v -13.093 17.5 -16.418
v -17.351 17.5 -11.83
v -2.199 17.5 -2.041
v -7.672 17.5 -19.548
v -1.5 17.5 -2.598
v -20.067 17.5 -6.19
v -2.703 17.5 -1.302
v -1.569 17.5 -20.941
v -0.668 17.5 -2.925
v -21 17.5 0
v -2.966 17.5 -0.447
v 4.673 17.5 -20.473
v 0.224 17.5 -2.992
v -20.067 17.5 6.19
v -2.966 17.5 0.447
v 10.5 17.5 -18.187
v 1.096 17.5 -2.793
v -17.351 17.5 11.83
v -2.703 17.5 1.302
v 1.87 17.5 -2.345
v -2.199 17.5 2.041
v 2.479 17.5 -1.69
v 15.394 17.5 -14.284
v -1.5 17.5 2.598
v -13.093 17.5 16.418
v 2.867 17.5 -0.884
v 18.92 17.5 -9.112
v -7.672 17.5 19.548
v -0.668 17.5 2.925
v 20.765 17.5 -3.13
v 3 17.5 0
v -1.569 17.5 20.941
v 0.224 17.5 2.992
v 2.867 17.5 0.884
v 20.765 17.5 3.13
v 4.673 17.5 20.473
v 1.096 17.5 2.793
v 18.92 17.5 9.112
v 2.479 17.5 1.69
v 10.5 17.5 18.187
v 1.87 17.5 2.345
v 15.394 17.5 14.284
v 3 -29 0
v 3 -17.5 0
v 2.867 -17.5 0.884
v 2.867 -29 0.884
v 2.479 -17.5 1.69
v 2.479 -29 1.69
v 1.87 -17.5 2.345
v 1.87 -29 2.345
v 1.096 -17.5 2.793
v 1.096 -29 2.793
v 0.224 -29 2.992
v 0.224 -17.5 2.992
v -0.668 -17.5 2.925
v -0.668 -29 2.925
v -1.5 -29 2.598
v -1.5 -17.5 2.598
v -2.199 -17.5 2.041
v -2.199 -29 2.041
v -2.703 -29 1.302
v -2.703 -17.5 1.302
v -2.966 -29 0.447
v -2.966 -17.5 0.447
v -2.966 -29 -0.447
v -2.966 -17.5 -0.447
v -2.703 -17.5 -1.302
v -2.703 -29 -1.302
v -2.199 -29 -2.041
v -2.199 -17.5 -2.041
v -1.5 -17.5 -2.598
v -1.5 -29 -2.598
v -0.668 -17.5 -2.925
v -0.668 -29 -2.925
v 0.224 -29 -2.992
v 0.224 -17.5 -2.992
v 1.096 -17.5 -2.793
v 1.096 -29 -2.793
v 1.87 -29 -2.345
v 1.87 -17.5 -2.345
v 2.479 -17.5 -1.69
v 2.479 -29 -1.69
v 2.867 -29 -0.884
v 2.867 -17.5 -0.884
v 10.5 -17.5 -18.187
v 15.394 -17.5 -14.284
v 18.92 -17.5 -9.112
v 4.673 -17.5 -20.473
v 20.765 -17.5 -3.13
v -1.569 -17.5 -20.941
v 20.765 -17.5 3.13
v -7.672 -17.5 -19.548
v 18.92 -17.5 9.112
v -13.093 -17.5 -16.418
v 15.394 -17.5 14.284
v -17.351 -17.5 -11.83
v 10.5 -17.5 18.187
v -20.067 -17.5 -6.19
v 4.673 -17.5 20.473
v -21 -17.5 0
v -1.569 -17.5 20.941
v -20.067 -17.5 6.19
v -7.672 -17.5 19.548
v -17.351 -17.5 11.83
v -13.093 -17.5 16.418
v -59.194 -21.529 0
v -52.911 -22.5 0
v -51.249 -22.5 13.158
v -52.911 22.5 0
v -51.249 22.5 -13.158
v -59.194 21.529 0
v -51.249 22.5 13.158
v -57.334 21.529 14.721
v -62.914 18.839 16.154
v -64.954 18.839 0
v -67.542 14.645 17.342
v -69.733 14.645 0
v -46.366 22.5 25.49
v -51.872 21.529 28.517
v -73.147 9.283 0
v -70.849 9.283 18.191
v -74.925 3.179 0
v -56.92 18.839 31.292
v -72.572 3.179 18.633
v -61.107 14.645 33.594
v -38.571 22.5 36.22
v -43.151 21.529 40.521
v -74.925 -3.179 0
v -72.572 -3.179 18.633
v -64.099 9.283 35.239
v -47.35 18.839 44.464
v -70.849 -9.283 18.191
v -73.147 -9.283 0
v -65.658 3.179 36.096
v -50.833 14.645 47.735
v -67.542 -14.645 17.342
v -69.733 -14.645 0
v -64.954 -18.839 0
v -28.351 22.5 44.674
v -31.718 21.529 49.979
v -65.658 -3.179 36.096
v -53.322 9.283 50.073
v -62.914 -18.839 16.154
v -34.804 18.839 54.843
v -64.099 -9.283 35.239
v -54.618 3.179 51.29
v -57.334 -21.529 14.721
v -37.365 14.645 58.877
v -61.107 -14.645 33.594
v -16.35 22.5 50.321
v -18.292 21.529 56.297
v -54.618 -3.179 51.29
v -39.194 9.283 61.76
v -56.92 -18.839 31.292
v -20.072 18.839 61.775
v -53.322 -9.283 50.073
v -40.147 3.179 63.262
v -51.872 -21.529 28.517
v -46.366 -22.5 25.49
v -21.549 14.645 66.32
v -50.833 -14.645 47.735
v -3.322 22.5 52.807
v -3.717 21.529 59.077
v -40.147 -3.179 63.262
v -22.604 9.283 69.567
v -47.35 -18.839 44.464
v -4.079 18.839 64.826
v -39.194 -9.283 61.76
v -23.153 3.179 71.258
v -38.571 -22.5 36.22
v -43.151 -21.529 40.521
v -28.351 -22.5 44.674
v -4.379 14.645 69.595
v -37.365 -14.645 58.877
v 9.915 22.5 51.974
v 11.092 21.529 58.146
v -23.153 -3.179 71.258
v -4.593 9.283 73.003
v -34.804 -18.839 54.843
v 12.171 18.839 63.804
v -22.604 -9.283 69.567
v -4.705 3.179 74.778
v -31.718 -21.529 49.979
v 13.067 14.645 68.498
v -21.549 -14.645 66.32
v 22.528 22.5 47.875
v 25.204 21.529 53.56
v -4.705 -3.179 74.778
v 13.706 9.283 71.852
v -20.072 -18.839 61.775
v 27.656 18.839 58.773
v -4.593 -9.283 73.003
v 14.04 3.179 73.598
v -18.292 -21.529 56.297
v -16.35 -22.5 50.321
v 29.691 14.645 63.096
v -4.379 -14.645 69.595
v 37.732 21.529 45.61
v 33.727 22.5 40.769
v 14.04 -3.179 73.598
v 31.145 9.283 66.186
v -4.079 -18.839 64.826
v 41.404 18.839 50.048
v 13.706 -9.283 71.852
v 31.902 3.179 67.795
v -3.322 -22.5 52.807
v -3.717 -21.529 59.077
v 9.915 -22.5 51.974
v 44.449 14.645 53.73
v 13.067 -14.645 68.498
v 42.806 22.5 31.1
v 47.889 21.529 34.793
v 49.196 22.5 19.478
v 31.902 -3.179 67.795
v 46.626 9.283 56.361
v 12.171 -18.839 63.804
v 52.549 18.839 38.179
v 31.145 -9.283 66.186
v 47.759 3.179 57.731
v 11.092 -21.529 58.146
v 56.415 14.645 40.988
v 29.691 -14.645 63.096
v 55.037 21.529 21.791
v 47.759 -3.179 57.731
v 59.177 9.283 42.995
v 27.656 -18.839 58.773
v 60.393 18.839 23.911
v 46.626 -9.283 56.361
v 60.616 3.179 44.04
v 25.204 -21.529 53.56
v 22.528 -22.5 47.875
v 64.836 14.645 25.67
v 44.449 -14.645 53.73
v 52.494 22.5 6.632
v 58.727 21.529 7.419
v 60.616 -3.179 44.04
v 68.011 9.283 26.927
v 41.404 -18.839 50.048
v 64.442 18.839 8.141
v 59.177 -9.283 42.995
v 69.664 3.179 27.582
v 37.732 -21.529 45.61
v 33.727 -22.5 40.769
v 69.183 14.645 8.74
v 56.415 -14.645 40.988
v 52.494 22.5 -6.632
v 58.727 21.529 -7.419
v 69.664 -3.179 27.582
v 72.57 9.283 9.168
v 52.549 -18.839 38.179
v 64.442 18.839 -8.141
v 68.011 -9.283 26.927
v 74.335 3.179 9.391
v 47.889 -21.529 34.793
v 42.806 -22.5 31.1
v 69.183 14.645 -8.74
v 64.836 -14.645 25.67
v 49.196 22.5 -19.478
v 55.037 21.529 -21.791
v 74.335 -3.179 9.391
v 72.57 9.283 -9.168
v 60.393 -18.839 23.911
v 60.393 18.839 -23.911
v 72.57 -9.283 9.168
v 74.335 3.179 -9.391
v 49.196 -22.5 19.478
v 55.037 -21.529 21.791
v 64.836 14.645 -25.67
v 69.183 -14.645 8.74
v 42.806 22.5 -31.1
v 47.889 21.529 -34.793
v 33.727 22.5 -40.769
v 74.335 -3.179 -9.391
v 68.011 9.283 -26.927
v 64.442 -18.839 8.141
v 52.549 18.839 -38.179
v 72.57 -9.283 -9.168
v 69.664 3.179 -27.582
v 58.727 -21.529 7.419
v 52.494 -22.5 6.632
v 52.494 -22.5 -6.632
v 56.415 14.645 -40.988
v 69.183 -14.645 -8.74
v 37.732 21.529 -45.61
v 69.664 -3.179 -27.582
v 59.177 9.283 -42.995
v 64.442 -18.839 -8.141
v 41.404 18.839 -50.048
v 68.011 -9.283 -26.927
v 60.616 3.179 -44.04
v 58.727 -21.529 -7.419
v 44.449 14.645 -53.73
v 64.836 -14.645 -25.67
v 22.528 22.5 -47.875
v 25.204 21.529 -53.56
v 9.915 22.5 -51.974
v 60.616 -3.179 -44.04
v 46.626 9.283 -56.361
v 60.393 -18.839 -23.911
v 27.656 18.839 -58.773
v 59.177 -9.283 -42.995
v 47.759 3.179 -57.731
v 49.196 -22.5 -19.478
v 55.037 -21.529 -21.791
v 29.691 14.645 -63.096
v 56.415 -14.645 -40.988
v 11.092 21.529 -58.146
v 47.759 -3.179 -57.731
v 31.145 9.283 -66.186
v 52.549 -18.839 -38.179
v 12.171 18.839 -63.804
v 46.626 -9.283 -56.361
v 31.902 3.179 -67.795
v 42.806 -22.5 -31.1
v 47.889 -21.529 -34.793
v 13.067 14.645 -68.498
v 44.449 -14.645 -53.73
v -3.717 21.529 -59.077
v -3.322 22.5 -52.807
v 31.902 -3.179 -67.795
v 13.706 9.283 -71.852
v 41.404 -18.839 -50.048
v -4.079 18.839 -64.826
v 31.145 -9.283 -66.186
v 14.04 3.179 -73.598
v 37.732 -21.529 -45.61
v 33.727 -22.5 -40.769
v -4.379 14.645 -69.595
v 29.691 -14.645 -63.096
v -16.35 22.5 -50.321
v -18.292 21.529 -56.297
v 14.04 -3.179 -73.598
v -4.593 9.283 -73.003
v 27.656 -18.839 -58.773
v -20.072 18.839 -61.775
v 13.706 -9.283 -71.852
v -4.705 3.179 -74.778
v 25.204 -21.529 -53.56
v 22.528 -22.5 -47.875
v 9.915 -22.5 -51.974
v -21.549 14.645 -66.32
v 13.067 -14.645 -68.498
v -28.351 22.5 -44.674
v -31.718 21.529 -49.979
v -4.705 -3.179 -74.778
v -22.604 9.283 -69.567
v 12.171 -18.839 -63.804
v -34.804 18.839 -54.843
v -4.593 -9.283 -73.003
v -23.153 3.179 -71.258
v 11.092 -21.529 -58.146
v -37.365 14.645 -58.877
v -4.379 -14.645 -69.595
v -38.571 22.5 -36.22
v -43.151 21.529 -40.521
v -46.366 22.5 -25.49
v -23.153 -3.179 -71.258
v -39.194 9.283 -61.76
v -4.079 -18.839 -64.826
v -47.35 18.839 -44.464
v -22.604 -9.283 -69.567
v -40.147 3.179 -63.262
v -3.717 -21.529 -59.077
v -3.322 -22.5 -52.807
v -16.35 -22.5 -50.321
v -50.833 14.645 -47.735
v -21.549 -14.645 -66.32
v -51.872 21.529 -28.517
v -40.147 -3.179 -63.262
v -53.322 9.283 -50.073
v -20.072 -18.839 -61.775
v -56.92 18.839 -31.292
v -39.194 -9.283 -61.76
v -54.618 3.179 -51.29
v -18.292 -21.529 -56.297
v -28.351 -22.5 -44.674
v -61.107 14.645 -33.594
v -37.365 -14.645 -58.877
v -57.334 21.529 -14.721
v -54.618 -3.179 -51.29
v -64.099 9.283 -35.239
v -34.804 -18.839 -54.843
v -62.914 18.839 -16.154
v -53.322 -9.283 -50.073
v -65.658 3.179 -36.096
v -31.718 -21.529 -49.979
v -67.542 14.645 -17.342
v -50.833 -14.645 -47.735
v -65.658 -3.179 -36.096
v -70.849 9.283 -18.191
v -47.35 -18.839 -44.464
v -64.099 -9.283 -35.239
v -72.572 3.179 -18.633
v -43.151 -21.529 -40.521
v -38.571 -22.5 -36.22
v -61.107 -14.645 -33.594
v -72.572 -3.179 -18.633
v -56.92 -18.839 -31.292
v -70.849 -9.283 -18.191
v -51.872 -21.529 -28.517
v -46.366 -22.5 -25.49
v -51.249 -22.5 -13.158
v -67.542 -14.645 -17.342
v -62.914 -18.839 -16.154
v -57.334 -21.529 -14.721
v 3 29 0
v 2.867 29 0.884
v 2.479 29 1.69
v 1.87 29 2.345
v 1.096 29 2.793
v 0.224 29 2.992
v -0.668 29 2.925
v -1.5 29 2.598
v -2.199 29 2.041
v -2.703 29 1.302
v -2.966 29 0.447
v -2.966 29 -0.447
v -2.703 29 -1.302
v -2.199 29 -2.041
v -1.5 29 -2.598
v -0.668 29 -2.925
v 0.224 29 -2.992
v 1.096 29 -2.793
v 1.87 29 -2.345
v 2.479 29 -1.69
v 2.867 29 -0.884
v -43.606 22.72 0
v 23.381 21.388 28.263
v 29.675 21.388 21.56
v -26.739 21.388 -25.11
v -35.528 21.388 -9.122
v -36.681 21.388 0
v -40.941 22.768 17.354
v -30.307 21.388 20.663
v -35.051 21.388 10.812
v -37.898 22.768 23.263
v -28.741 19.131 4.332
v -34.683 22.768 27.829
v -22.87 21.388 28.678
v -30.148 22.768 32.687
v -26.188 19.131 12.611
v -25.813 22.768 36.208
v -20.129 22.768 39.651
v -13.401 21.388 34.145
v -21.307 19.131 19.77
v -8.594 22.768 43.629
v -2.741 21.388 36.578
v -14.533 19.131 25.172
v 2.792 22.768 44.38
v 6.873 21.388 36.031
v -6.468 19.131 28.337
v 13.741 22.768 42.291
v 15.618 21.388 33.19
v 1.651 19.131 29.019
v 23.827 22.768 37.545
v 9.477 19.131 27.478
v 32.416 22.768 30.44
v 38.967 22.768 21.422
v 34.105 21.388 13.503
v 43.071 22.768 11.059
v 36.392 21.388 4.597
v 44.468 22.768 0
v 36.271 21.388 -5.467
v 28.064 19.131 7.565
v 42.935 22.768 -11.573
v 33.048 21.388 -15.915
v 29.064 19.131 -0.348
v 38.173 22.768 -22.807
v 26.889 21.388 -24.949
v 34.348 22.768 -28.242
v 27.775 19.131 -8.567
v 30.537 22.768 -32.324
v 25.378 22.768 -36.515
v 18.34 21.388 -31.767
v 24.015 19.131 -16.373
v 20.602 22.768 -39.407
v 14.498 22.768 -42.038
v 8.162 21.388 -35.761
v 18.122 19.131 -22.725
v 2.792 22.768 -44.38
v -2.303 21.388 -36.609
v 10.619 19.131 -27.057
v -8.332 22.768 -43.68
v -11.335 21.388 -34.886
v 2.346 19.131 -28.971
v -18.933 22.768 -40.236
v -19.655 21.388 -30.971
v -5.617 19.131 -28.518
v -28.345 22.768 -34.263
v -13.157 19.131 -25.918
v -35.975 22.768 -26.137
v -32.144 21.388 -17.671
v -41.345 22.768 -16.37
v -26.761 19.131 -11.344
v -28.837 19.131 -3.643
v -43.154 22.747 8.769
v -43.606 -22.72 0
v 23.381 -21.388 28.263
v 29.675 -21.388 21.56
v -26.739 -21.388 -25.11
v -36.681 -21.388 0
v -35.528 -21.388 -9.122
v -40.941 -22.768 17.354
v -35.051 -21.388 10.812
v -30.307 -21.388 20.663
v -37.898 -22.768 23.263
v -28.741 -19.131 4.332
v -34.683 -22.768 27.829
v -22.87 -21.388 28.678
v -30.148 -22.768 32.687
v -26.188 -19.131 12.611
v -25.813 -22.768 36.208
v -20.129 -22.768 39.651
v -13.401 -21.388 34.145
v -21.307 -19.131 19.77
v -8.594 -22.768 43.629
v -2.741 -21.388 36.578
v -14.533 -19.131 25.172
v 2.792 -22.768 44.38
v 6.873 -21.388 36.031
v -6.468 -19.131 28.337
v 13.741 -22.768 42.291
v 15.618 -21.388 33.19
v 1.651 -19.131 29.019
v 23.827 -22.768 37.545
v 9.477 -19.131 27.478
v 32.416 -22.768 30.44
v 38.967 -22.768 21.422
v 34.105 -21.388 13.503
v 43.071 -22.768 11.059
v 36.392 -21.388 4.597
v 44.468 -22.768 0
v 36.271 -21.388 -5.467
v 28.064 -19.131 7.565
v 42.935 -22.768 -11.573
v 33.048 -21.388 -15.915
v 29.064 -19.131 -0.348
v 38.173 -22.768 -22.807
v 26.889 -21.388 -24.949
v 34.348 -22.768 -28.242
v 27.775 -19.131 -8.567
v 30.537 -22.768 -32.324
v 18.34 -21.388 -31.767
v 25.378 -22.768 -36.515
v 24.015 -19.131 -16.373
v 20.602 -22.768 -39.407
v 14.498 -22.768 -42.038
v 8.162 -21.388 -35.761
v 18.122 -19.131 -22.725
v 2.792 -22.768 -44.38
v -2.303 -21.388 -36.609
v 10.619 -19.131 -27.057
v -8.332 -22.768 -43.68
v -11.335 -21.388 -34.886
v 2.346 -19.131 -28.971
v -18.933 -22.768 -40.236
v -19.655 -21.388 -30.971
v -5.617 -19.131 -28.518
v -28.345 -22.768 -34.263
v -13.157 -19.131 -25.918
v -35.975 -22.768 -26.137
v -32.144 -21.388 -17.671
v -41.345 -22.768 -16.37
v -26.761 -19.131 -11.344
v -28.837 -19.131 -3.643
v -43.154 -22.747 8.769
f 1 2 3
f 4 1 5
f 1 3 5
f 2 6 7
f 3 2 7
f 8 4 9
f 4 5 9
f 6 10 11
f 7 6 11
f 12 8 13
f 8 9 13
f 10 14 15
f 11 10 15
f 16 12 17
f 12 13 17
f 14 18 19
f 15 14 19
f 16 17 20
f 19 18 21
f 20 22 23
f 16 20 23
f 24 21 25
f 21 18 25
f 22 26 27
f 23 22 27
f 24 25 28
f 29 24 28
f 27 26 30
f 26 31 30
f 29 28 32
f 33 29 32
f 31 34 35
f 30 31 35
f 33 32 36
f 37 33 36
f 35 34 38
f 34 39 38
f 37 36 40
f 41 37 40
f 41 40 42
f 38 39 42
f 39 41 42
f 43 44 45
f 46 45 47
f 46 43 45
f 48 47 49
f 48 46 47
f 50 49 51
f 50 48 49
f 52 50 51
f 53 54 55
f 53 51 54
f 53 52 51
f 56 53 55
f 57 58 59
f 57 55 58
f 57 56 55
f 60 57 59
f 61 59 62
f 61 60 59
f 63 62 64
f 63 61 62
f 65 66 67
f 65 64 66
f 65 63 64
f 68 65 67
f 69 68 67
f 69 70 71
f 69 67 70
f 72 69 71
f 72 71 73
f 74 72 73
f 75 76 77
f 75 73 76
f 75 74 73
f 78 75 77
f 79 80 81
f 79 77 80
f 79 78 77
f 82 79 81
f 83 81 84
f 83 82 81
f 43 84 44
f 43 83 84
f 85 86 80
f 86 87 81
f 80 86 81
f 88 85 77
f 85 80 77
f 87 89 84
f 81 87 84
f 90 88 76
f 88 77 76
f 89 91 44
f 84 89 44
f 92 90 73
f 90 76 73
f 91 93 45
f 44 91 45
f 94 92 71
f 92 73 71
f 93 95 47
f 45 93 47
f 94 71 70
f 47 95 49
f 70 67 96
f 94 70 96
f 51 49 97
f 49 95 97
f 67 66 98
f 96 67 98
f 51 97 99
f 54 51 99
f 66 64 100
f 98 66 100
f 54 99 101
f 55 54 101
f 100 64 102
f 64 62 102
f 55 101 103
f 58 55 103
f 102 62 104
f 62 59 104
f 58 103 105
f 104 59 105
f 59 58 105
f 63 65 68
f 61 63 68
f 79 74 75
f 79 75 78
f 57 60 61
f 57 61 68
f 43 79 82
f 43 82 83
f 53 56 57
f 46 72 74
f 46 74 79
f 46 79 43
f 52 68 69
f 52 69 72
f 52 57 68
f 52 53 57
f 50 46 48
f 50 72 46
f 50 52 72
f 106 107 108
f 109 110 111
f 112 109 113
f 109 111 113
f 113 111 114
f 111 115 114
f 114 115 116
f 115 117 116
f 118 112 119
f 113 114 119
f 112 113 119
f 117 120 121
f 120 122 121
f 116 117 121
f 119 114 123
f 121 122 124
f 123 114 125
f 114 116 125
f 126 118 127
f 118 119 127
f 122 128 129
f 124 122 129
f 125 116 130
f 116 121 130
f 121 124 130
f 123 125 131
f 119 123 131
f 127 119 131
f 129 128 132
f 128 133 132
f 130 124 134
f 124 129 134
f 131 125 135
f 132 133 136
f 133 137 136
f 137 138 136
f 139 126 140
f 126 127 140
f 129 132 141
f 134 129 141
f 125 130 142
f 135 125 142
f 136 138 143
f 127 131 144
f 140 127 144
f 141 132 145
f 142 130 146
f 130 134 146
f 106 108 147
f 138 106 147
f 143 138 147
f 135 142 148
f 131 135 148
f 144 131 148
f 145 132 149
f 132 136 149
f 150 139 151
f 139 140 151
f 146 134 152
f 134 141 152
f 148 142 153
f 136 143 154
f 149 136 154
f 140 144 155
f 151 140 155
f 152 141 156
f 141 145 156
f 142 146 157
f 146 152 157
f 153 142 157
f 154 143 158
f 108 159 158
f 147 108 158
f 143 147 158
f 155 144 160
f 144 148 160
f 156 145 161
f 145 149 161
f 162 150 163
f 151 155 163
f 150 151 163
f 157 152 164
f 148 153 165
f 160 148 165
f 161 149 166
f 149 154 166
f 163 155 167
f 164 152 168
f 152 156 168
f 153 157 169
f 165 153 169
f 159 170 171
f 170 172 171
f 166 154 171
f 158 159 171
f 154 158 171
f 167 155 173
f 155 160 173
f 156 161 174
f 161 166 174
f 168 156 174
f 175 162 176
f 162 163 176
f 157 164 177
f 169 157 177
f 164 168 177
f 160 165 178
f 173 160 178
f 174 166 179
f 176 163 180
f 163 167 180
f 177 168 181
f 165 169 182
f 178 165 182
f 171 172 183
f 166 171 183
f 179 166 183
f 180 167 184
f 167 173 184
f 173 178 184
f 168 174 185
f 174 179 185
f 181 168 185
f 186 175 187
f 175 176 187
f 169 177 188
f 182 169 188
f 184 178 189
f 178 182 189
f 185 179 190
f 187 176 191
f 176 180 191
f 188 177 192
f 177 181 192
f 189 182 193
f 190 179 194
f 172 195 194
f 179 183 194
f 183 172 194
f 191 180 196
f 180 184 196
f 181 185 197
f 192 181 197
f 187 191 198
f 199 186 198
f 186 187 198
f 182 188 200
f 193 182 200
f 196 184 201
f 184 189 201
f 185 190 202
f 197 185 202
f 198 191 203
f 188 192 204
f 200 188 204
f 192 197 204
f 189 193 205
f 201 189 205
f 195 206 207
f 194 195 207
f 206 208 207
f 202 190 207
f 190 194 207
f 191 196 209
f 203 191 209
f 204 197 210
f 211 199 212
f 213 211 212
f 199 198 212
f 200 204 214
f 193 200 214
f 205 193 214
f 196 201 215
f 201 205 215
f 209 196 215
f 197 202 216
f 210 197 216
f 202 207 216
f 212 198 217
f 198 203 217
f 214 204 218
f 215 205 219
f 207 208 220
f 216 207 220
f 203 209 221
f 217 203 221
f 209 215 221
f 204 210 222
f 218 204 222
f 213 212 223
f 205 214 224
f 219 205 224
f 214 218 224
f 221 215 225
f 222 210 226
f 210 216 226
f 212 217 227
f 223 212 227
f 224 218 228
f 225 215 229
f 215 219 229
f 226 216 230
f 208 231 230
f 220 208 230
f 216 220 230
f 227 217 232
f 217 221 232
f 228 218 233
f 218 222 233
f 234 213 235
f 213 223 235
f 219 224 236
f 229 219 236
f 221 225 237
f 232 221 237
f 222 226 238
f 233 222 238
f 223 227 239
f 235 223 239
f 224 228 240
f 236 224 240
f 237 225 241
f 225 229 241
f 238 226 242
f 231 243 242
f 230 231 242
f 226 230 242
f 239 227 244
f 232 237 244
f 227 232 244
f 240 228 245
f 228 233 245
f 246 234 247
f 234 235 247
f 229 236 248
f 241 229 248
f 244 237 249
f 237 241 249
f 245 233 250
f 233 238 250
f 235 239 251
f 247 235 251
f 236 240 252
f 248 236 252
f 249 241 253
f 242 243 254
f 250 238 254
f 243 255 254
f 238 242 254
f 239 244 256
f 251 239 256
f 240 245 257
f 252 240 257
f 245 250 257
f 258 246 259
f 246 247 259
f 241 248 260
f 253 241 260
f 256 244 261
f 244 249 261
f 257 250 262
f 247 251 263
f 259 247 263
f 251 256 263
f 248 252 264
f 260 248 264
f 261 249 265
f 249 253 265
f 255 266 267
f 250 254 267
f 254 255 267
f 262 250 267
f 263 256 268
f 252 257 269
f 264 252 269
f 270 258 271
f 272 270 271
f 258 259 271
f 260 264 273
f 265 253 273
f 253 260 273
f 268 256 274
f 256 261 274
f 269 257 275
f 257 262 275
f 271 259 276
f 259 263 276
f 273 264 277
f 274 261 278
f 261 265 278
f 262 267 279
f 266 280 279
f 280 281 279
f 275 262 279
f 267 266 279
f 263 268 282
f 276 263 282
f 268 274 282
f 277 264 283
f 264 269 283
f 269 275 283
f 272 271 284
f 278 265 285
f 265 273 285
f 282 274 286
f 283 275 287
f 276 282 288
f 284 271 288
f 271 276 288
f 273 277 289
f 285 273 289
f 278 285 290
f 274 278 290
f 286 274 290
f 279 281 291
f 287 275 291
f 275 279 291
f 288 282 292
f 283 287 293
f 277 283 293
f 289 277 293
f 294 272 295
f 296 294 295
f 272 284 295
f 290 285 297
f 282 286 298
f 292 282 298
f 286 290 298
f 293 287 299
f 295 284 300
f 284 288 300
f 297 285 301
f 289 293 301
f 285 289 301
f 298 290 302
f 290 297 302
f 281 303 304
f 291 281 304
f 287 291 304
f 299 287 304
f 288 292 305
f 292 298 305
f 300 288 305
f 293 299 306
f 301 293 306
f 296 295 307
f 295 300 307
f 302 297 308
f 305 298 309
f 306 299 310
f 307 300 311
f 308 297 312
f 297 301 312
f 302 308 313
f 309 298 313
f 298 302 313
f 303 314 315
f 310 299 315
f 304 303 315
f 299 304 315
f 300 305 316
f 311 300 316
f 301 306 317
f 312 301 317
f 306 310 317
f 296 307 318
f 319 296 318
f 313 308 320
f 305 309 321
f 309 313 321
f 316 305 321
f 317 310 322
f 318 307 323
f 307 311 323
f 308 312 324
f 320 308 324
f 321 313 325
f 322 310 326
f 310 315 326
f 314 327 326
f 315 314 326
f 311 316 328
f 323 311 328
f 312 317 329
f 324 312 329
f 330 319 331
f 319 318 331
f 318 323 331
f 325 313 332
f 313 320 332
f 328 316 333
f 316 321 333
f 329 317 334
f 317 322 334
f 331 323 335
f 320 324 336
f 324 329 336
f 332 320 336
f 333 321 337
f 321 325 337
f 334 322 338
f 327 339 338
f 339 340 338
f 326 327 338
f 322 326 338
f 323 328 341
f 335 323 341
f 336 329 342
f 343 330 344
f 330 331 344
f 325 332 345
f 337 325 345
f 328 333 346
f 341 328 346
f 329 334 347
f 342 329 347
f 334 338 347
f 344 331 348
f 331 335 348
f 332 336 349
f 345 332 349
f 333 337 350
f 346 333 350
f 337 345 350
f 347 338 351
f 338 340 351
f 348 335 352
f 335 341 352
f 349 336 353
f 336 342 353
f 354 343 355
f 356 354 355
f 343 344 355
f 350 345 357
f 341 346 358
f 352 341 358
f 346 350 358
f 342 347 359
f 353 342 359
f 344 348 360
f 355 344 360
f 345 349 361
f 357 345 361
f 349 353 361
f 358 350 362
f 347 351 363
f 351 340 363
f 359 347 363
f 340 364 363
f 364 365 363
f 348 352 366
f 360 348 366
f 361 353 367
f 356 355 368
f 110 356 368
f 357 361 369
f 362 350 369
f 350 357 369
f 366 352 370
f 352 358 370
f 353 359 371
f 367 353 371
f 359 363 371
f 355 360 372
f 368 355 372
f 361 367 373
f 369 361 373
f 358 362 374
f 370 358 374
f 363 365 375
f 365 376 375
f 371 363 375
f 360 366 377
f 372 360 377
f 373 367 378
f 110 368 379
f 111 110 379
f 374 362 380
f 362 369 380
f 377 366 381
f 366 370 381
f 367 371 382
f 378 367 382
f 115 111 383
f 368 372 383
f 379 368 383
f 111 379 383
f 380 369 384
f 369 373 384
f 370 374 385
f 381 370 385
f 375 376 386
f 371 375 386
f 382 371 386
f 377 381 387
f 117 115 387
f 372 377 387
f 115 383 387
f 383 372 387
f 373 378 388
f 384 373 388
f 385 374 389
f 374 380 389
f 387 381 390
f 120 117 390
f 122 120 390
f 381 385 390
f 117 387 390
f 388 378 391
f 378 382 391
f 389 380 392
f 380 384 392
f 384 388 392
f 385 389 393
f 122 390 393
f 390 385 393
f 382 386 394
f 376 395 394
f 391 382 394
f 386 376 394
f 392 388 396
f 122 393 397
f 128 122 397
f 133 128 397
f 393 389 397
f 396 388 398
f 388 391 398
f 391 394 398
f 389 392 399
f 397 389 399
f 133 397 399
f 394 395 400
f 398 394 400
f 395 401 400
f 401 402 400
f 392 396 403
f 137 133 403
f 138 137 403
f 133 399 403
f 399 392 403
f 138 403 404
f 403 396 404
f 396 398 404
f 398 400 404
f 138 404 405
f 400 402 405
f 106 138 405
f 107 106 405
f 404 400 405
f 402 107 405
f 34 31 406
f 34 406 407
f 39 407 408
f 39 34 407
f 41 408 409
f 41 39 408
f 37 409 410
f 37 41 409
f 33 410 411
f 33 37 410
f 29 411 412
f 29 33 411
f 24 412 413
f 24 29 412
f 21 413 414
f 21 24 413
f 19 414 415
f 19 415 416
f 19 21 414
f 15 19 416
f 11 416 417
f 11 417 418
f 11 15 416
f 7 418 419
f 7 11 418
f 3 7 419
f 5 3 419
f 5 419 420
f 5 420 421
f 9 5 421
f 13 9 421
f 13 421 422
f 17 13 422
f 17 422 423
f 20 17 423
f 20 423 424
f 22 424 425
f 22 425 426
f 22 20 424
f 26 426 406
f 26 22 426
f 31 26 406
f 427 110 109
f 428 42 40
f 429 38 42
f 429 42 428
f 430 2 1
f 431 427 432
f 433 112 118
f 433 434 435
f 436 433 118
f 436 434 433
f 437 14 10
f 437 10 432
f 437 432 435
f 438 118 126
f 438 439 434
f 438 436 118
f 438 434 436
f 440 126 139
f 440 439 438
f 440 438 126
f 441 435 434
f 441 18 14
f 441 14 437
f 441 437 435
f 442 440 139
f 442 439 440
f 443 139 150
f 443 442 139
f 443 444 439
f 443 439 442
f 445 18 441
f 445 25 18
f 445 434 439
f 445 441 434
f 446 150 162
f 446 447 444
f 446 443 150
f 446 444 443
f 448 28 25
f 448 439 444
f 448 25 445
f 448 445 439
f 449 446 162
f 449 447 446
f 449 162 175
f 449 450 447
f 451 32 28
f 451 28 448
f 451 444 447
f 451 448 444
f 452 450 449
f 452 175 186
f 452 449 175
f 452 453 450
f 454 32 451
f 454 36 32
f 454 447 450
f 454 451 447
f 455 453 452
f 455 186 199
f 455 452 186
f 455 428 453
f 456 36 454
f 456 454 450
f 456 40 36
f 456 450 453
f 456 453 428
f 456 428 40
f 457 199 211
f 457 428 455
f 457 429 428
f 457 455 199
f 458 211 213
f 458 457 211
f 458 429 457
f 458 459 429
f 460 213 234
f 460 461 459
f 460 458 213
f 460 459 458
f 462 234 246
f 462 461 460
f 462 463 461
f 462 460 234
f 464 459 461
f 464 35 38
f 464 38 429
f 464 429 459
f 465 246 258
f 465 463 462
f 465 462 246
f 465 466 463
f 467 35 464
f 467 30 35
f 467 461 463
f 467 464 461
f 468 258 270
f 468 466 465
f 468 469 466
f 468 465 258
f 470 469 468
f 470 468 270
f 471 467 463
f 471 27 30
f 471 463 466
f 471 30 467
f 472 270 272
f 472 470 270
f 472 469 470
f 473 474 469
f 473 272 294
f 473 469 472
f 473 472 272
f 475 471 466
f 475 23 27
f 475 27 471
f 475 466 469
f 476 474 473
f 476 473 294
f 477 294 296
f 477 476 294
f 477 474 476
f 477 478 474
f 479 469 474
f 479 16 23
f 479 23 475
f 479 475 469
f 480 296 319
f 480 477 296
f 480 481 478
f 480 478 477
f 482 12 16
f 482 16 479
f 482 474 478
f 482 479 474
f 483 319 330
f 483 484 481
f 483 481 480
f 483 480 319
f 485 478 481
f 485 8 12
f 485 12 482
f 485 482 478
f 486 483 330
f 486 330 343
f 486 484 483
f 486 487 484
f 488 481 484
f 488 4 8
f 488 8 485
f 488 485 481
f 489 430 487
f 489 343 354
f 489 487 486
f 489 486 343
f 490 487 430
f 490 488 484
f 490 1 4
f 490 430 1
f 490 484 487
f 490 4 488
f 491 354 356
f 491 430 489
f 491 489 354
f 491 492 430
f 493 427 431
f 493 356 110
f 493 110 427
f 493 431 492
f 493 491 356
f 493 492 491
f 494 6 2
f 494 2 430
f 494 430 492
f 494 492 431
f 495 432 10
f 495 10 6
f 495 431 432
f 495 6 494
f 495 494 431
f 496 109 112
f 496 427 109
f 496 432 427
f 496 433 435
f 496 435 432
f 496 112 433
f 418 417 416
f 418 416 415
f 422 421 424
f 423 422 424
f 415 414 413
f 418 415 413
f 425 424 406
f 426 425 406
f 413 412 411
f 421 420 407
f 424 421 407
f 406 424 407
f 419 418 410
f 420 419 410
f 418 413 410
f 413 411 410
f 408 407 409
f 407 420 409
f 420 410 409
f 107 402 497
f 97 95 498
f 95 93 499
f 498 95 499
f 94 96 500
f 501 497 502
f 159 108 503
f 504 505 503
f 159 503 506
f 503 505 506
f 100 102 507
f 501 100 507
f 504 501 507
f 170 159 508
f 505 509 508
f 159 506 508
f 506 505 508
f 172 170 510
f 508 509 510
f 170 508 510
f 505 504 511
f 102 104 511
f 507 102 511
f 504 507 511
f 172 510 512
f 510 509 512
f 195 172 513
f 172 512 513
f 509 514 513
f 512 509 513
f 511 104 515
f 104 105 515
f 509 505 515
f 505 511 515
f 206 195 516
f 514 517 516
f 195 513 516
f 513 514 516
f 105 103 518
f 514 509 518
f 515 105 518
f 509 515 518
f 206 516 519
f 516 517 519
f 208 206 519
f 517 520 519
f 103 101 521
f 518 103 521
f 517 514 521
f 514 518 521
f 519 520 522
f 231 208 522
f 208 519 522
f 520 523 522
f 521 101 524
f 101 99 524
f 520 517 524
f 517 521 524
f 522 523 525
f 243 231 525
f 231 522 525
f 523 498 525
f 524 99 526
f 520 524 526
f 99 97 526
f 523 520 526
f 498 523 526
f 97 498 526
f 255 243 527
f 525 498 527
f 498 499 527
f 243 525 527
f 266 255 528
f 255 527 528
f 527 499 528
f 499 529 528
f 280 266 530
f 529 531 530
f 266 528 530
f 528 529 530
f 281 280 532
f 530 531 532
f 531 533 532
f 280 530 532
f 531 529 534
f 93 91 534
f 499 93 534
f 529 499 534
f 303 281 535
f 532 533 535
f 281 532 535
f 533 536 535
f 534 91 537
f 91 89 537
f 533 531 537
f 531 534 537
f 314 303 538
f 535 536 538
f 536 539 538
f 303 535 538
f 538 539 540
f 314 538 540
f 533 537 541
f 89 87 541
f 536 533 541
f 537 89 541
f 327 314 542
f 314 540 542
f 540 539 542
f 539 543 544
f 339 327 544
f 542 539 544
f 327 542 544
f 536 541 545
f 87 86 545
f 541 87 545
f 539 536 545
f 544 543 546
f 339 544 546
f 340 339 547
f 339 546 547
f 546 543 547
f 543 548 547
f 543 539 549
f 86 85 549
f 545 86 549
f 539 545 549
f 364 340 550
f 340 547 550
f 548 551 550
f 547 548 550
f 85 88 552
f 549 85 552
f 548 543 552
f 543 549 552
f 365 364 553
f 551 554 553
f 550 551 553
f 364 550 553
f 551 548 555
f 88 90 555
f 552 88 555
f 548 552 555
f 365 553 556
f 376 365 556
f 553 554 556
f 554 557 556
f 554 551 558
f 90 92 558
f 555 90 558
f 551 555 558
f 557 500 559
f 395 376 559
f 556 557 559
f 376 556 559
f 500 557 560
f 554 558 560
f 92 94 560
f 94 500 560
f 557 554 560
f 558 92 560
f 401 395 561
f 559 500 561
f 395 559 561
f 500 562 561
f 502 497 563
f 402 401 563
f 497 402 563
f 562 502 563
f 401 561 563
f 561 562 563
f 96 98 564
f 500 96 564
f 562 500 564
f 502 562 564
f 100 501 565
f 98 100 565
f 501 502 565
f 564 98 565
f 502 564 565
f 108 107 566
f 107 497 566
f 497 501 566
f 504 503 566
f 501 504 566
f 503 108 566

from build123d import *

# Parameters (mm, degrees)
F2_R     = 3
F3_DEPTH = 29


with BuildPart() as f1:
    # F0 (on Top) → F1 (revolve)
    with BuildSketch(Plane.XY):
        with BuildLine():
            Line((-3, 0), (-3, 17.4995933901))
            Line((-3, 17.4995933901), (-21, 17.4995933901))
            add(Edge.make_bspline(
                [(-52.9111102223, 22.5), (-49.0063974427, 22.770887551), (-41.4137818802, 23.2581714642), (-31.7984179158, 19.6037849598), (-24.6587238594, 18.0655321125), (-21, 17.4995933901)],
                knots=[0, 0, 0, 0, 0.3420035898, 0.664256839, 1, 1, 1, 1], degree=3))
            ThreePointArc((-52.9111102223, 22.5), (-75.1510886965, 0), (-52.9111102223, -22.5))
            add(Edge.make_bspline(
                [(-52.9111102223, -22.5), (-49.0063974427, -22.770887551), (-41.4137818802, -23.2581714642), (-31.7984179158, -19.6037849598), (-24.6587238594, -18.0655321125), (-21, -17.4995933901)],
                knots=[0, 0, 0, 0, 0.3420035898, 0.664256839, 1, 1, 1, 1], degree=3))
            Line((-21, -17.4995933901), (-3, -17.4995933901))
            Line((-3, -17.4995933901), (-3, 0))
        make_face()
    revolve(axis=Axis((0, 13.3384466171, 0), (0, 1, 0)))

    # F2 (on Front) → F3 (join, symmetric)
    with BuildSketch(Plane.XZ):
        Circle(F2_R)
    extrude(amount=F3_DEPTH, both=True)


solid = f1.part
